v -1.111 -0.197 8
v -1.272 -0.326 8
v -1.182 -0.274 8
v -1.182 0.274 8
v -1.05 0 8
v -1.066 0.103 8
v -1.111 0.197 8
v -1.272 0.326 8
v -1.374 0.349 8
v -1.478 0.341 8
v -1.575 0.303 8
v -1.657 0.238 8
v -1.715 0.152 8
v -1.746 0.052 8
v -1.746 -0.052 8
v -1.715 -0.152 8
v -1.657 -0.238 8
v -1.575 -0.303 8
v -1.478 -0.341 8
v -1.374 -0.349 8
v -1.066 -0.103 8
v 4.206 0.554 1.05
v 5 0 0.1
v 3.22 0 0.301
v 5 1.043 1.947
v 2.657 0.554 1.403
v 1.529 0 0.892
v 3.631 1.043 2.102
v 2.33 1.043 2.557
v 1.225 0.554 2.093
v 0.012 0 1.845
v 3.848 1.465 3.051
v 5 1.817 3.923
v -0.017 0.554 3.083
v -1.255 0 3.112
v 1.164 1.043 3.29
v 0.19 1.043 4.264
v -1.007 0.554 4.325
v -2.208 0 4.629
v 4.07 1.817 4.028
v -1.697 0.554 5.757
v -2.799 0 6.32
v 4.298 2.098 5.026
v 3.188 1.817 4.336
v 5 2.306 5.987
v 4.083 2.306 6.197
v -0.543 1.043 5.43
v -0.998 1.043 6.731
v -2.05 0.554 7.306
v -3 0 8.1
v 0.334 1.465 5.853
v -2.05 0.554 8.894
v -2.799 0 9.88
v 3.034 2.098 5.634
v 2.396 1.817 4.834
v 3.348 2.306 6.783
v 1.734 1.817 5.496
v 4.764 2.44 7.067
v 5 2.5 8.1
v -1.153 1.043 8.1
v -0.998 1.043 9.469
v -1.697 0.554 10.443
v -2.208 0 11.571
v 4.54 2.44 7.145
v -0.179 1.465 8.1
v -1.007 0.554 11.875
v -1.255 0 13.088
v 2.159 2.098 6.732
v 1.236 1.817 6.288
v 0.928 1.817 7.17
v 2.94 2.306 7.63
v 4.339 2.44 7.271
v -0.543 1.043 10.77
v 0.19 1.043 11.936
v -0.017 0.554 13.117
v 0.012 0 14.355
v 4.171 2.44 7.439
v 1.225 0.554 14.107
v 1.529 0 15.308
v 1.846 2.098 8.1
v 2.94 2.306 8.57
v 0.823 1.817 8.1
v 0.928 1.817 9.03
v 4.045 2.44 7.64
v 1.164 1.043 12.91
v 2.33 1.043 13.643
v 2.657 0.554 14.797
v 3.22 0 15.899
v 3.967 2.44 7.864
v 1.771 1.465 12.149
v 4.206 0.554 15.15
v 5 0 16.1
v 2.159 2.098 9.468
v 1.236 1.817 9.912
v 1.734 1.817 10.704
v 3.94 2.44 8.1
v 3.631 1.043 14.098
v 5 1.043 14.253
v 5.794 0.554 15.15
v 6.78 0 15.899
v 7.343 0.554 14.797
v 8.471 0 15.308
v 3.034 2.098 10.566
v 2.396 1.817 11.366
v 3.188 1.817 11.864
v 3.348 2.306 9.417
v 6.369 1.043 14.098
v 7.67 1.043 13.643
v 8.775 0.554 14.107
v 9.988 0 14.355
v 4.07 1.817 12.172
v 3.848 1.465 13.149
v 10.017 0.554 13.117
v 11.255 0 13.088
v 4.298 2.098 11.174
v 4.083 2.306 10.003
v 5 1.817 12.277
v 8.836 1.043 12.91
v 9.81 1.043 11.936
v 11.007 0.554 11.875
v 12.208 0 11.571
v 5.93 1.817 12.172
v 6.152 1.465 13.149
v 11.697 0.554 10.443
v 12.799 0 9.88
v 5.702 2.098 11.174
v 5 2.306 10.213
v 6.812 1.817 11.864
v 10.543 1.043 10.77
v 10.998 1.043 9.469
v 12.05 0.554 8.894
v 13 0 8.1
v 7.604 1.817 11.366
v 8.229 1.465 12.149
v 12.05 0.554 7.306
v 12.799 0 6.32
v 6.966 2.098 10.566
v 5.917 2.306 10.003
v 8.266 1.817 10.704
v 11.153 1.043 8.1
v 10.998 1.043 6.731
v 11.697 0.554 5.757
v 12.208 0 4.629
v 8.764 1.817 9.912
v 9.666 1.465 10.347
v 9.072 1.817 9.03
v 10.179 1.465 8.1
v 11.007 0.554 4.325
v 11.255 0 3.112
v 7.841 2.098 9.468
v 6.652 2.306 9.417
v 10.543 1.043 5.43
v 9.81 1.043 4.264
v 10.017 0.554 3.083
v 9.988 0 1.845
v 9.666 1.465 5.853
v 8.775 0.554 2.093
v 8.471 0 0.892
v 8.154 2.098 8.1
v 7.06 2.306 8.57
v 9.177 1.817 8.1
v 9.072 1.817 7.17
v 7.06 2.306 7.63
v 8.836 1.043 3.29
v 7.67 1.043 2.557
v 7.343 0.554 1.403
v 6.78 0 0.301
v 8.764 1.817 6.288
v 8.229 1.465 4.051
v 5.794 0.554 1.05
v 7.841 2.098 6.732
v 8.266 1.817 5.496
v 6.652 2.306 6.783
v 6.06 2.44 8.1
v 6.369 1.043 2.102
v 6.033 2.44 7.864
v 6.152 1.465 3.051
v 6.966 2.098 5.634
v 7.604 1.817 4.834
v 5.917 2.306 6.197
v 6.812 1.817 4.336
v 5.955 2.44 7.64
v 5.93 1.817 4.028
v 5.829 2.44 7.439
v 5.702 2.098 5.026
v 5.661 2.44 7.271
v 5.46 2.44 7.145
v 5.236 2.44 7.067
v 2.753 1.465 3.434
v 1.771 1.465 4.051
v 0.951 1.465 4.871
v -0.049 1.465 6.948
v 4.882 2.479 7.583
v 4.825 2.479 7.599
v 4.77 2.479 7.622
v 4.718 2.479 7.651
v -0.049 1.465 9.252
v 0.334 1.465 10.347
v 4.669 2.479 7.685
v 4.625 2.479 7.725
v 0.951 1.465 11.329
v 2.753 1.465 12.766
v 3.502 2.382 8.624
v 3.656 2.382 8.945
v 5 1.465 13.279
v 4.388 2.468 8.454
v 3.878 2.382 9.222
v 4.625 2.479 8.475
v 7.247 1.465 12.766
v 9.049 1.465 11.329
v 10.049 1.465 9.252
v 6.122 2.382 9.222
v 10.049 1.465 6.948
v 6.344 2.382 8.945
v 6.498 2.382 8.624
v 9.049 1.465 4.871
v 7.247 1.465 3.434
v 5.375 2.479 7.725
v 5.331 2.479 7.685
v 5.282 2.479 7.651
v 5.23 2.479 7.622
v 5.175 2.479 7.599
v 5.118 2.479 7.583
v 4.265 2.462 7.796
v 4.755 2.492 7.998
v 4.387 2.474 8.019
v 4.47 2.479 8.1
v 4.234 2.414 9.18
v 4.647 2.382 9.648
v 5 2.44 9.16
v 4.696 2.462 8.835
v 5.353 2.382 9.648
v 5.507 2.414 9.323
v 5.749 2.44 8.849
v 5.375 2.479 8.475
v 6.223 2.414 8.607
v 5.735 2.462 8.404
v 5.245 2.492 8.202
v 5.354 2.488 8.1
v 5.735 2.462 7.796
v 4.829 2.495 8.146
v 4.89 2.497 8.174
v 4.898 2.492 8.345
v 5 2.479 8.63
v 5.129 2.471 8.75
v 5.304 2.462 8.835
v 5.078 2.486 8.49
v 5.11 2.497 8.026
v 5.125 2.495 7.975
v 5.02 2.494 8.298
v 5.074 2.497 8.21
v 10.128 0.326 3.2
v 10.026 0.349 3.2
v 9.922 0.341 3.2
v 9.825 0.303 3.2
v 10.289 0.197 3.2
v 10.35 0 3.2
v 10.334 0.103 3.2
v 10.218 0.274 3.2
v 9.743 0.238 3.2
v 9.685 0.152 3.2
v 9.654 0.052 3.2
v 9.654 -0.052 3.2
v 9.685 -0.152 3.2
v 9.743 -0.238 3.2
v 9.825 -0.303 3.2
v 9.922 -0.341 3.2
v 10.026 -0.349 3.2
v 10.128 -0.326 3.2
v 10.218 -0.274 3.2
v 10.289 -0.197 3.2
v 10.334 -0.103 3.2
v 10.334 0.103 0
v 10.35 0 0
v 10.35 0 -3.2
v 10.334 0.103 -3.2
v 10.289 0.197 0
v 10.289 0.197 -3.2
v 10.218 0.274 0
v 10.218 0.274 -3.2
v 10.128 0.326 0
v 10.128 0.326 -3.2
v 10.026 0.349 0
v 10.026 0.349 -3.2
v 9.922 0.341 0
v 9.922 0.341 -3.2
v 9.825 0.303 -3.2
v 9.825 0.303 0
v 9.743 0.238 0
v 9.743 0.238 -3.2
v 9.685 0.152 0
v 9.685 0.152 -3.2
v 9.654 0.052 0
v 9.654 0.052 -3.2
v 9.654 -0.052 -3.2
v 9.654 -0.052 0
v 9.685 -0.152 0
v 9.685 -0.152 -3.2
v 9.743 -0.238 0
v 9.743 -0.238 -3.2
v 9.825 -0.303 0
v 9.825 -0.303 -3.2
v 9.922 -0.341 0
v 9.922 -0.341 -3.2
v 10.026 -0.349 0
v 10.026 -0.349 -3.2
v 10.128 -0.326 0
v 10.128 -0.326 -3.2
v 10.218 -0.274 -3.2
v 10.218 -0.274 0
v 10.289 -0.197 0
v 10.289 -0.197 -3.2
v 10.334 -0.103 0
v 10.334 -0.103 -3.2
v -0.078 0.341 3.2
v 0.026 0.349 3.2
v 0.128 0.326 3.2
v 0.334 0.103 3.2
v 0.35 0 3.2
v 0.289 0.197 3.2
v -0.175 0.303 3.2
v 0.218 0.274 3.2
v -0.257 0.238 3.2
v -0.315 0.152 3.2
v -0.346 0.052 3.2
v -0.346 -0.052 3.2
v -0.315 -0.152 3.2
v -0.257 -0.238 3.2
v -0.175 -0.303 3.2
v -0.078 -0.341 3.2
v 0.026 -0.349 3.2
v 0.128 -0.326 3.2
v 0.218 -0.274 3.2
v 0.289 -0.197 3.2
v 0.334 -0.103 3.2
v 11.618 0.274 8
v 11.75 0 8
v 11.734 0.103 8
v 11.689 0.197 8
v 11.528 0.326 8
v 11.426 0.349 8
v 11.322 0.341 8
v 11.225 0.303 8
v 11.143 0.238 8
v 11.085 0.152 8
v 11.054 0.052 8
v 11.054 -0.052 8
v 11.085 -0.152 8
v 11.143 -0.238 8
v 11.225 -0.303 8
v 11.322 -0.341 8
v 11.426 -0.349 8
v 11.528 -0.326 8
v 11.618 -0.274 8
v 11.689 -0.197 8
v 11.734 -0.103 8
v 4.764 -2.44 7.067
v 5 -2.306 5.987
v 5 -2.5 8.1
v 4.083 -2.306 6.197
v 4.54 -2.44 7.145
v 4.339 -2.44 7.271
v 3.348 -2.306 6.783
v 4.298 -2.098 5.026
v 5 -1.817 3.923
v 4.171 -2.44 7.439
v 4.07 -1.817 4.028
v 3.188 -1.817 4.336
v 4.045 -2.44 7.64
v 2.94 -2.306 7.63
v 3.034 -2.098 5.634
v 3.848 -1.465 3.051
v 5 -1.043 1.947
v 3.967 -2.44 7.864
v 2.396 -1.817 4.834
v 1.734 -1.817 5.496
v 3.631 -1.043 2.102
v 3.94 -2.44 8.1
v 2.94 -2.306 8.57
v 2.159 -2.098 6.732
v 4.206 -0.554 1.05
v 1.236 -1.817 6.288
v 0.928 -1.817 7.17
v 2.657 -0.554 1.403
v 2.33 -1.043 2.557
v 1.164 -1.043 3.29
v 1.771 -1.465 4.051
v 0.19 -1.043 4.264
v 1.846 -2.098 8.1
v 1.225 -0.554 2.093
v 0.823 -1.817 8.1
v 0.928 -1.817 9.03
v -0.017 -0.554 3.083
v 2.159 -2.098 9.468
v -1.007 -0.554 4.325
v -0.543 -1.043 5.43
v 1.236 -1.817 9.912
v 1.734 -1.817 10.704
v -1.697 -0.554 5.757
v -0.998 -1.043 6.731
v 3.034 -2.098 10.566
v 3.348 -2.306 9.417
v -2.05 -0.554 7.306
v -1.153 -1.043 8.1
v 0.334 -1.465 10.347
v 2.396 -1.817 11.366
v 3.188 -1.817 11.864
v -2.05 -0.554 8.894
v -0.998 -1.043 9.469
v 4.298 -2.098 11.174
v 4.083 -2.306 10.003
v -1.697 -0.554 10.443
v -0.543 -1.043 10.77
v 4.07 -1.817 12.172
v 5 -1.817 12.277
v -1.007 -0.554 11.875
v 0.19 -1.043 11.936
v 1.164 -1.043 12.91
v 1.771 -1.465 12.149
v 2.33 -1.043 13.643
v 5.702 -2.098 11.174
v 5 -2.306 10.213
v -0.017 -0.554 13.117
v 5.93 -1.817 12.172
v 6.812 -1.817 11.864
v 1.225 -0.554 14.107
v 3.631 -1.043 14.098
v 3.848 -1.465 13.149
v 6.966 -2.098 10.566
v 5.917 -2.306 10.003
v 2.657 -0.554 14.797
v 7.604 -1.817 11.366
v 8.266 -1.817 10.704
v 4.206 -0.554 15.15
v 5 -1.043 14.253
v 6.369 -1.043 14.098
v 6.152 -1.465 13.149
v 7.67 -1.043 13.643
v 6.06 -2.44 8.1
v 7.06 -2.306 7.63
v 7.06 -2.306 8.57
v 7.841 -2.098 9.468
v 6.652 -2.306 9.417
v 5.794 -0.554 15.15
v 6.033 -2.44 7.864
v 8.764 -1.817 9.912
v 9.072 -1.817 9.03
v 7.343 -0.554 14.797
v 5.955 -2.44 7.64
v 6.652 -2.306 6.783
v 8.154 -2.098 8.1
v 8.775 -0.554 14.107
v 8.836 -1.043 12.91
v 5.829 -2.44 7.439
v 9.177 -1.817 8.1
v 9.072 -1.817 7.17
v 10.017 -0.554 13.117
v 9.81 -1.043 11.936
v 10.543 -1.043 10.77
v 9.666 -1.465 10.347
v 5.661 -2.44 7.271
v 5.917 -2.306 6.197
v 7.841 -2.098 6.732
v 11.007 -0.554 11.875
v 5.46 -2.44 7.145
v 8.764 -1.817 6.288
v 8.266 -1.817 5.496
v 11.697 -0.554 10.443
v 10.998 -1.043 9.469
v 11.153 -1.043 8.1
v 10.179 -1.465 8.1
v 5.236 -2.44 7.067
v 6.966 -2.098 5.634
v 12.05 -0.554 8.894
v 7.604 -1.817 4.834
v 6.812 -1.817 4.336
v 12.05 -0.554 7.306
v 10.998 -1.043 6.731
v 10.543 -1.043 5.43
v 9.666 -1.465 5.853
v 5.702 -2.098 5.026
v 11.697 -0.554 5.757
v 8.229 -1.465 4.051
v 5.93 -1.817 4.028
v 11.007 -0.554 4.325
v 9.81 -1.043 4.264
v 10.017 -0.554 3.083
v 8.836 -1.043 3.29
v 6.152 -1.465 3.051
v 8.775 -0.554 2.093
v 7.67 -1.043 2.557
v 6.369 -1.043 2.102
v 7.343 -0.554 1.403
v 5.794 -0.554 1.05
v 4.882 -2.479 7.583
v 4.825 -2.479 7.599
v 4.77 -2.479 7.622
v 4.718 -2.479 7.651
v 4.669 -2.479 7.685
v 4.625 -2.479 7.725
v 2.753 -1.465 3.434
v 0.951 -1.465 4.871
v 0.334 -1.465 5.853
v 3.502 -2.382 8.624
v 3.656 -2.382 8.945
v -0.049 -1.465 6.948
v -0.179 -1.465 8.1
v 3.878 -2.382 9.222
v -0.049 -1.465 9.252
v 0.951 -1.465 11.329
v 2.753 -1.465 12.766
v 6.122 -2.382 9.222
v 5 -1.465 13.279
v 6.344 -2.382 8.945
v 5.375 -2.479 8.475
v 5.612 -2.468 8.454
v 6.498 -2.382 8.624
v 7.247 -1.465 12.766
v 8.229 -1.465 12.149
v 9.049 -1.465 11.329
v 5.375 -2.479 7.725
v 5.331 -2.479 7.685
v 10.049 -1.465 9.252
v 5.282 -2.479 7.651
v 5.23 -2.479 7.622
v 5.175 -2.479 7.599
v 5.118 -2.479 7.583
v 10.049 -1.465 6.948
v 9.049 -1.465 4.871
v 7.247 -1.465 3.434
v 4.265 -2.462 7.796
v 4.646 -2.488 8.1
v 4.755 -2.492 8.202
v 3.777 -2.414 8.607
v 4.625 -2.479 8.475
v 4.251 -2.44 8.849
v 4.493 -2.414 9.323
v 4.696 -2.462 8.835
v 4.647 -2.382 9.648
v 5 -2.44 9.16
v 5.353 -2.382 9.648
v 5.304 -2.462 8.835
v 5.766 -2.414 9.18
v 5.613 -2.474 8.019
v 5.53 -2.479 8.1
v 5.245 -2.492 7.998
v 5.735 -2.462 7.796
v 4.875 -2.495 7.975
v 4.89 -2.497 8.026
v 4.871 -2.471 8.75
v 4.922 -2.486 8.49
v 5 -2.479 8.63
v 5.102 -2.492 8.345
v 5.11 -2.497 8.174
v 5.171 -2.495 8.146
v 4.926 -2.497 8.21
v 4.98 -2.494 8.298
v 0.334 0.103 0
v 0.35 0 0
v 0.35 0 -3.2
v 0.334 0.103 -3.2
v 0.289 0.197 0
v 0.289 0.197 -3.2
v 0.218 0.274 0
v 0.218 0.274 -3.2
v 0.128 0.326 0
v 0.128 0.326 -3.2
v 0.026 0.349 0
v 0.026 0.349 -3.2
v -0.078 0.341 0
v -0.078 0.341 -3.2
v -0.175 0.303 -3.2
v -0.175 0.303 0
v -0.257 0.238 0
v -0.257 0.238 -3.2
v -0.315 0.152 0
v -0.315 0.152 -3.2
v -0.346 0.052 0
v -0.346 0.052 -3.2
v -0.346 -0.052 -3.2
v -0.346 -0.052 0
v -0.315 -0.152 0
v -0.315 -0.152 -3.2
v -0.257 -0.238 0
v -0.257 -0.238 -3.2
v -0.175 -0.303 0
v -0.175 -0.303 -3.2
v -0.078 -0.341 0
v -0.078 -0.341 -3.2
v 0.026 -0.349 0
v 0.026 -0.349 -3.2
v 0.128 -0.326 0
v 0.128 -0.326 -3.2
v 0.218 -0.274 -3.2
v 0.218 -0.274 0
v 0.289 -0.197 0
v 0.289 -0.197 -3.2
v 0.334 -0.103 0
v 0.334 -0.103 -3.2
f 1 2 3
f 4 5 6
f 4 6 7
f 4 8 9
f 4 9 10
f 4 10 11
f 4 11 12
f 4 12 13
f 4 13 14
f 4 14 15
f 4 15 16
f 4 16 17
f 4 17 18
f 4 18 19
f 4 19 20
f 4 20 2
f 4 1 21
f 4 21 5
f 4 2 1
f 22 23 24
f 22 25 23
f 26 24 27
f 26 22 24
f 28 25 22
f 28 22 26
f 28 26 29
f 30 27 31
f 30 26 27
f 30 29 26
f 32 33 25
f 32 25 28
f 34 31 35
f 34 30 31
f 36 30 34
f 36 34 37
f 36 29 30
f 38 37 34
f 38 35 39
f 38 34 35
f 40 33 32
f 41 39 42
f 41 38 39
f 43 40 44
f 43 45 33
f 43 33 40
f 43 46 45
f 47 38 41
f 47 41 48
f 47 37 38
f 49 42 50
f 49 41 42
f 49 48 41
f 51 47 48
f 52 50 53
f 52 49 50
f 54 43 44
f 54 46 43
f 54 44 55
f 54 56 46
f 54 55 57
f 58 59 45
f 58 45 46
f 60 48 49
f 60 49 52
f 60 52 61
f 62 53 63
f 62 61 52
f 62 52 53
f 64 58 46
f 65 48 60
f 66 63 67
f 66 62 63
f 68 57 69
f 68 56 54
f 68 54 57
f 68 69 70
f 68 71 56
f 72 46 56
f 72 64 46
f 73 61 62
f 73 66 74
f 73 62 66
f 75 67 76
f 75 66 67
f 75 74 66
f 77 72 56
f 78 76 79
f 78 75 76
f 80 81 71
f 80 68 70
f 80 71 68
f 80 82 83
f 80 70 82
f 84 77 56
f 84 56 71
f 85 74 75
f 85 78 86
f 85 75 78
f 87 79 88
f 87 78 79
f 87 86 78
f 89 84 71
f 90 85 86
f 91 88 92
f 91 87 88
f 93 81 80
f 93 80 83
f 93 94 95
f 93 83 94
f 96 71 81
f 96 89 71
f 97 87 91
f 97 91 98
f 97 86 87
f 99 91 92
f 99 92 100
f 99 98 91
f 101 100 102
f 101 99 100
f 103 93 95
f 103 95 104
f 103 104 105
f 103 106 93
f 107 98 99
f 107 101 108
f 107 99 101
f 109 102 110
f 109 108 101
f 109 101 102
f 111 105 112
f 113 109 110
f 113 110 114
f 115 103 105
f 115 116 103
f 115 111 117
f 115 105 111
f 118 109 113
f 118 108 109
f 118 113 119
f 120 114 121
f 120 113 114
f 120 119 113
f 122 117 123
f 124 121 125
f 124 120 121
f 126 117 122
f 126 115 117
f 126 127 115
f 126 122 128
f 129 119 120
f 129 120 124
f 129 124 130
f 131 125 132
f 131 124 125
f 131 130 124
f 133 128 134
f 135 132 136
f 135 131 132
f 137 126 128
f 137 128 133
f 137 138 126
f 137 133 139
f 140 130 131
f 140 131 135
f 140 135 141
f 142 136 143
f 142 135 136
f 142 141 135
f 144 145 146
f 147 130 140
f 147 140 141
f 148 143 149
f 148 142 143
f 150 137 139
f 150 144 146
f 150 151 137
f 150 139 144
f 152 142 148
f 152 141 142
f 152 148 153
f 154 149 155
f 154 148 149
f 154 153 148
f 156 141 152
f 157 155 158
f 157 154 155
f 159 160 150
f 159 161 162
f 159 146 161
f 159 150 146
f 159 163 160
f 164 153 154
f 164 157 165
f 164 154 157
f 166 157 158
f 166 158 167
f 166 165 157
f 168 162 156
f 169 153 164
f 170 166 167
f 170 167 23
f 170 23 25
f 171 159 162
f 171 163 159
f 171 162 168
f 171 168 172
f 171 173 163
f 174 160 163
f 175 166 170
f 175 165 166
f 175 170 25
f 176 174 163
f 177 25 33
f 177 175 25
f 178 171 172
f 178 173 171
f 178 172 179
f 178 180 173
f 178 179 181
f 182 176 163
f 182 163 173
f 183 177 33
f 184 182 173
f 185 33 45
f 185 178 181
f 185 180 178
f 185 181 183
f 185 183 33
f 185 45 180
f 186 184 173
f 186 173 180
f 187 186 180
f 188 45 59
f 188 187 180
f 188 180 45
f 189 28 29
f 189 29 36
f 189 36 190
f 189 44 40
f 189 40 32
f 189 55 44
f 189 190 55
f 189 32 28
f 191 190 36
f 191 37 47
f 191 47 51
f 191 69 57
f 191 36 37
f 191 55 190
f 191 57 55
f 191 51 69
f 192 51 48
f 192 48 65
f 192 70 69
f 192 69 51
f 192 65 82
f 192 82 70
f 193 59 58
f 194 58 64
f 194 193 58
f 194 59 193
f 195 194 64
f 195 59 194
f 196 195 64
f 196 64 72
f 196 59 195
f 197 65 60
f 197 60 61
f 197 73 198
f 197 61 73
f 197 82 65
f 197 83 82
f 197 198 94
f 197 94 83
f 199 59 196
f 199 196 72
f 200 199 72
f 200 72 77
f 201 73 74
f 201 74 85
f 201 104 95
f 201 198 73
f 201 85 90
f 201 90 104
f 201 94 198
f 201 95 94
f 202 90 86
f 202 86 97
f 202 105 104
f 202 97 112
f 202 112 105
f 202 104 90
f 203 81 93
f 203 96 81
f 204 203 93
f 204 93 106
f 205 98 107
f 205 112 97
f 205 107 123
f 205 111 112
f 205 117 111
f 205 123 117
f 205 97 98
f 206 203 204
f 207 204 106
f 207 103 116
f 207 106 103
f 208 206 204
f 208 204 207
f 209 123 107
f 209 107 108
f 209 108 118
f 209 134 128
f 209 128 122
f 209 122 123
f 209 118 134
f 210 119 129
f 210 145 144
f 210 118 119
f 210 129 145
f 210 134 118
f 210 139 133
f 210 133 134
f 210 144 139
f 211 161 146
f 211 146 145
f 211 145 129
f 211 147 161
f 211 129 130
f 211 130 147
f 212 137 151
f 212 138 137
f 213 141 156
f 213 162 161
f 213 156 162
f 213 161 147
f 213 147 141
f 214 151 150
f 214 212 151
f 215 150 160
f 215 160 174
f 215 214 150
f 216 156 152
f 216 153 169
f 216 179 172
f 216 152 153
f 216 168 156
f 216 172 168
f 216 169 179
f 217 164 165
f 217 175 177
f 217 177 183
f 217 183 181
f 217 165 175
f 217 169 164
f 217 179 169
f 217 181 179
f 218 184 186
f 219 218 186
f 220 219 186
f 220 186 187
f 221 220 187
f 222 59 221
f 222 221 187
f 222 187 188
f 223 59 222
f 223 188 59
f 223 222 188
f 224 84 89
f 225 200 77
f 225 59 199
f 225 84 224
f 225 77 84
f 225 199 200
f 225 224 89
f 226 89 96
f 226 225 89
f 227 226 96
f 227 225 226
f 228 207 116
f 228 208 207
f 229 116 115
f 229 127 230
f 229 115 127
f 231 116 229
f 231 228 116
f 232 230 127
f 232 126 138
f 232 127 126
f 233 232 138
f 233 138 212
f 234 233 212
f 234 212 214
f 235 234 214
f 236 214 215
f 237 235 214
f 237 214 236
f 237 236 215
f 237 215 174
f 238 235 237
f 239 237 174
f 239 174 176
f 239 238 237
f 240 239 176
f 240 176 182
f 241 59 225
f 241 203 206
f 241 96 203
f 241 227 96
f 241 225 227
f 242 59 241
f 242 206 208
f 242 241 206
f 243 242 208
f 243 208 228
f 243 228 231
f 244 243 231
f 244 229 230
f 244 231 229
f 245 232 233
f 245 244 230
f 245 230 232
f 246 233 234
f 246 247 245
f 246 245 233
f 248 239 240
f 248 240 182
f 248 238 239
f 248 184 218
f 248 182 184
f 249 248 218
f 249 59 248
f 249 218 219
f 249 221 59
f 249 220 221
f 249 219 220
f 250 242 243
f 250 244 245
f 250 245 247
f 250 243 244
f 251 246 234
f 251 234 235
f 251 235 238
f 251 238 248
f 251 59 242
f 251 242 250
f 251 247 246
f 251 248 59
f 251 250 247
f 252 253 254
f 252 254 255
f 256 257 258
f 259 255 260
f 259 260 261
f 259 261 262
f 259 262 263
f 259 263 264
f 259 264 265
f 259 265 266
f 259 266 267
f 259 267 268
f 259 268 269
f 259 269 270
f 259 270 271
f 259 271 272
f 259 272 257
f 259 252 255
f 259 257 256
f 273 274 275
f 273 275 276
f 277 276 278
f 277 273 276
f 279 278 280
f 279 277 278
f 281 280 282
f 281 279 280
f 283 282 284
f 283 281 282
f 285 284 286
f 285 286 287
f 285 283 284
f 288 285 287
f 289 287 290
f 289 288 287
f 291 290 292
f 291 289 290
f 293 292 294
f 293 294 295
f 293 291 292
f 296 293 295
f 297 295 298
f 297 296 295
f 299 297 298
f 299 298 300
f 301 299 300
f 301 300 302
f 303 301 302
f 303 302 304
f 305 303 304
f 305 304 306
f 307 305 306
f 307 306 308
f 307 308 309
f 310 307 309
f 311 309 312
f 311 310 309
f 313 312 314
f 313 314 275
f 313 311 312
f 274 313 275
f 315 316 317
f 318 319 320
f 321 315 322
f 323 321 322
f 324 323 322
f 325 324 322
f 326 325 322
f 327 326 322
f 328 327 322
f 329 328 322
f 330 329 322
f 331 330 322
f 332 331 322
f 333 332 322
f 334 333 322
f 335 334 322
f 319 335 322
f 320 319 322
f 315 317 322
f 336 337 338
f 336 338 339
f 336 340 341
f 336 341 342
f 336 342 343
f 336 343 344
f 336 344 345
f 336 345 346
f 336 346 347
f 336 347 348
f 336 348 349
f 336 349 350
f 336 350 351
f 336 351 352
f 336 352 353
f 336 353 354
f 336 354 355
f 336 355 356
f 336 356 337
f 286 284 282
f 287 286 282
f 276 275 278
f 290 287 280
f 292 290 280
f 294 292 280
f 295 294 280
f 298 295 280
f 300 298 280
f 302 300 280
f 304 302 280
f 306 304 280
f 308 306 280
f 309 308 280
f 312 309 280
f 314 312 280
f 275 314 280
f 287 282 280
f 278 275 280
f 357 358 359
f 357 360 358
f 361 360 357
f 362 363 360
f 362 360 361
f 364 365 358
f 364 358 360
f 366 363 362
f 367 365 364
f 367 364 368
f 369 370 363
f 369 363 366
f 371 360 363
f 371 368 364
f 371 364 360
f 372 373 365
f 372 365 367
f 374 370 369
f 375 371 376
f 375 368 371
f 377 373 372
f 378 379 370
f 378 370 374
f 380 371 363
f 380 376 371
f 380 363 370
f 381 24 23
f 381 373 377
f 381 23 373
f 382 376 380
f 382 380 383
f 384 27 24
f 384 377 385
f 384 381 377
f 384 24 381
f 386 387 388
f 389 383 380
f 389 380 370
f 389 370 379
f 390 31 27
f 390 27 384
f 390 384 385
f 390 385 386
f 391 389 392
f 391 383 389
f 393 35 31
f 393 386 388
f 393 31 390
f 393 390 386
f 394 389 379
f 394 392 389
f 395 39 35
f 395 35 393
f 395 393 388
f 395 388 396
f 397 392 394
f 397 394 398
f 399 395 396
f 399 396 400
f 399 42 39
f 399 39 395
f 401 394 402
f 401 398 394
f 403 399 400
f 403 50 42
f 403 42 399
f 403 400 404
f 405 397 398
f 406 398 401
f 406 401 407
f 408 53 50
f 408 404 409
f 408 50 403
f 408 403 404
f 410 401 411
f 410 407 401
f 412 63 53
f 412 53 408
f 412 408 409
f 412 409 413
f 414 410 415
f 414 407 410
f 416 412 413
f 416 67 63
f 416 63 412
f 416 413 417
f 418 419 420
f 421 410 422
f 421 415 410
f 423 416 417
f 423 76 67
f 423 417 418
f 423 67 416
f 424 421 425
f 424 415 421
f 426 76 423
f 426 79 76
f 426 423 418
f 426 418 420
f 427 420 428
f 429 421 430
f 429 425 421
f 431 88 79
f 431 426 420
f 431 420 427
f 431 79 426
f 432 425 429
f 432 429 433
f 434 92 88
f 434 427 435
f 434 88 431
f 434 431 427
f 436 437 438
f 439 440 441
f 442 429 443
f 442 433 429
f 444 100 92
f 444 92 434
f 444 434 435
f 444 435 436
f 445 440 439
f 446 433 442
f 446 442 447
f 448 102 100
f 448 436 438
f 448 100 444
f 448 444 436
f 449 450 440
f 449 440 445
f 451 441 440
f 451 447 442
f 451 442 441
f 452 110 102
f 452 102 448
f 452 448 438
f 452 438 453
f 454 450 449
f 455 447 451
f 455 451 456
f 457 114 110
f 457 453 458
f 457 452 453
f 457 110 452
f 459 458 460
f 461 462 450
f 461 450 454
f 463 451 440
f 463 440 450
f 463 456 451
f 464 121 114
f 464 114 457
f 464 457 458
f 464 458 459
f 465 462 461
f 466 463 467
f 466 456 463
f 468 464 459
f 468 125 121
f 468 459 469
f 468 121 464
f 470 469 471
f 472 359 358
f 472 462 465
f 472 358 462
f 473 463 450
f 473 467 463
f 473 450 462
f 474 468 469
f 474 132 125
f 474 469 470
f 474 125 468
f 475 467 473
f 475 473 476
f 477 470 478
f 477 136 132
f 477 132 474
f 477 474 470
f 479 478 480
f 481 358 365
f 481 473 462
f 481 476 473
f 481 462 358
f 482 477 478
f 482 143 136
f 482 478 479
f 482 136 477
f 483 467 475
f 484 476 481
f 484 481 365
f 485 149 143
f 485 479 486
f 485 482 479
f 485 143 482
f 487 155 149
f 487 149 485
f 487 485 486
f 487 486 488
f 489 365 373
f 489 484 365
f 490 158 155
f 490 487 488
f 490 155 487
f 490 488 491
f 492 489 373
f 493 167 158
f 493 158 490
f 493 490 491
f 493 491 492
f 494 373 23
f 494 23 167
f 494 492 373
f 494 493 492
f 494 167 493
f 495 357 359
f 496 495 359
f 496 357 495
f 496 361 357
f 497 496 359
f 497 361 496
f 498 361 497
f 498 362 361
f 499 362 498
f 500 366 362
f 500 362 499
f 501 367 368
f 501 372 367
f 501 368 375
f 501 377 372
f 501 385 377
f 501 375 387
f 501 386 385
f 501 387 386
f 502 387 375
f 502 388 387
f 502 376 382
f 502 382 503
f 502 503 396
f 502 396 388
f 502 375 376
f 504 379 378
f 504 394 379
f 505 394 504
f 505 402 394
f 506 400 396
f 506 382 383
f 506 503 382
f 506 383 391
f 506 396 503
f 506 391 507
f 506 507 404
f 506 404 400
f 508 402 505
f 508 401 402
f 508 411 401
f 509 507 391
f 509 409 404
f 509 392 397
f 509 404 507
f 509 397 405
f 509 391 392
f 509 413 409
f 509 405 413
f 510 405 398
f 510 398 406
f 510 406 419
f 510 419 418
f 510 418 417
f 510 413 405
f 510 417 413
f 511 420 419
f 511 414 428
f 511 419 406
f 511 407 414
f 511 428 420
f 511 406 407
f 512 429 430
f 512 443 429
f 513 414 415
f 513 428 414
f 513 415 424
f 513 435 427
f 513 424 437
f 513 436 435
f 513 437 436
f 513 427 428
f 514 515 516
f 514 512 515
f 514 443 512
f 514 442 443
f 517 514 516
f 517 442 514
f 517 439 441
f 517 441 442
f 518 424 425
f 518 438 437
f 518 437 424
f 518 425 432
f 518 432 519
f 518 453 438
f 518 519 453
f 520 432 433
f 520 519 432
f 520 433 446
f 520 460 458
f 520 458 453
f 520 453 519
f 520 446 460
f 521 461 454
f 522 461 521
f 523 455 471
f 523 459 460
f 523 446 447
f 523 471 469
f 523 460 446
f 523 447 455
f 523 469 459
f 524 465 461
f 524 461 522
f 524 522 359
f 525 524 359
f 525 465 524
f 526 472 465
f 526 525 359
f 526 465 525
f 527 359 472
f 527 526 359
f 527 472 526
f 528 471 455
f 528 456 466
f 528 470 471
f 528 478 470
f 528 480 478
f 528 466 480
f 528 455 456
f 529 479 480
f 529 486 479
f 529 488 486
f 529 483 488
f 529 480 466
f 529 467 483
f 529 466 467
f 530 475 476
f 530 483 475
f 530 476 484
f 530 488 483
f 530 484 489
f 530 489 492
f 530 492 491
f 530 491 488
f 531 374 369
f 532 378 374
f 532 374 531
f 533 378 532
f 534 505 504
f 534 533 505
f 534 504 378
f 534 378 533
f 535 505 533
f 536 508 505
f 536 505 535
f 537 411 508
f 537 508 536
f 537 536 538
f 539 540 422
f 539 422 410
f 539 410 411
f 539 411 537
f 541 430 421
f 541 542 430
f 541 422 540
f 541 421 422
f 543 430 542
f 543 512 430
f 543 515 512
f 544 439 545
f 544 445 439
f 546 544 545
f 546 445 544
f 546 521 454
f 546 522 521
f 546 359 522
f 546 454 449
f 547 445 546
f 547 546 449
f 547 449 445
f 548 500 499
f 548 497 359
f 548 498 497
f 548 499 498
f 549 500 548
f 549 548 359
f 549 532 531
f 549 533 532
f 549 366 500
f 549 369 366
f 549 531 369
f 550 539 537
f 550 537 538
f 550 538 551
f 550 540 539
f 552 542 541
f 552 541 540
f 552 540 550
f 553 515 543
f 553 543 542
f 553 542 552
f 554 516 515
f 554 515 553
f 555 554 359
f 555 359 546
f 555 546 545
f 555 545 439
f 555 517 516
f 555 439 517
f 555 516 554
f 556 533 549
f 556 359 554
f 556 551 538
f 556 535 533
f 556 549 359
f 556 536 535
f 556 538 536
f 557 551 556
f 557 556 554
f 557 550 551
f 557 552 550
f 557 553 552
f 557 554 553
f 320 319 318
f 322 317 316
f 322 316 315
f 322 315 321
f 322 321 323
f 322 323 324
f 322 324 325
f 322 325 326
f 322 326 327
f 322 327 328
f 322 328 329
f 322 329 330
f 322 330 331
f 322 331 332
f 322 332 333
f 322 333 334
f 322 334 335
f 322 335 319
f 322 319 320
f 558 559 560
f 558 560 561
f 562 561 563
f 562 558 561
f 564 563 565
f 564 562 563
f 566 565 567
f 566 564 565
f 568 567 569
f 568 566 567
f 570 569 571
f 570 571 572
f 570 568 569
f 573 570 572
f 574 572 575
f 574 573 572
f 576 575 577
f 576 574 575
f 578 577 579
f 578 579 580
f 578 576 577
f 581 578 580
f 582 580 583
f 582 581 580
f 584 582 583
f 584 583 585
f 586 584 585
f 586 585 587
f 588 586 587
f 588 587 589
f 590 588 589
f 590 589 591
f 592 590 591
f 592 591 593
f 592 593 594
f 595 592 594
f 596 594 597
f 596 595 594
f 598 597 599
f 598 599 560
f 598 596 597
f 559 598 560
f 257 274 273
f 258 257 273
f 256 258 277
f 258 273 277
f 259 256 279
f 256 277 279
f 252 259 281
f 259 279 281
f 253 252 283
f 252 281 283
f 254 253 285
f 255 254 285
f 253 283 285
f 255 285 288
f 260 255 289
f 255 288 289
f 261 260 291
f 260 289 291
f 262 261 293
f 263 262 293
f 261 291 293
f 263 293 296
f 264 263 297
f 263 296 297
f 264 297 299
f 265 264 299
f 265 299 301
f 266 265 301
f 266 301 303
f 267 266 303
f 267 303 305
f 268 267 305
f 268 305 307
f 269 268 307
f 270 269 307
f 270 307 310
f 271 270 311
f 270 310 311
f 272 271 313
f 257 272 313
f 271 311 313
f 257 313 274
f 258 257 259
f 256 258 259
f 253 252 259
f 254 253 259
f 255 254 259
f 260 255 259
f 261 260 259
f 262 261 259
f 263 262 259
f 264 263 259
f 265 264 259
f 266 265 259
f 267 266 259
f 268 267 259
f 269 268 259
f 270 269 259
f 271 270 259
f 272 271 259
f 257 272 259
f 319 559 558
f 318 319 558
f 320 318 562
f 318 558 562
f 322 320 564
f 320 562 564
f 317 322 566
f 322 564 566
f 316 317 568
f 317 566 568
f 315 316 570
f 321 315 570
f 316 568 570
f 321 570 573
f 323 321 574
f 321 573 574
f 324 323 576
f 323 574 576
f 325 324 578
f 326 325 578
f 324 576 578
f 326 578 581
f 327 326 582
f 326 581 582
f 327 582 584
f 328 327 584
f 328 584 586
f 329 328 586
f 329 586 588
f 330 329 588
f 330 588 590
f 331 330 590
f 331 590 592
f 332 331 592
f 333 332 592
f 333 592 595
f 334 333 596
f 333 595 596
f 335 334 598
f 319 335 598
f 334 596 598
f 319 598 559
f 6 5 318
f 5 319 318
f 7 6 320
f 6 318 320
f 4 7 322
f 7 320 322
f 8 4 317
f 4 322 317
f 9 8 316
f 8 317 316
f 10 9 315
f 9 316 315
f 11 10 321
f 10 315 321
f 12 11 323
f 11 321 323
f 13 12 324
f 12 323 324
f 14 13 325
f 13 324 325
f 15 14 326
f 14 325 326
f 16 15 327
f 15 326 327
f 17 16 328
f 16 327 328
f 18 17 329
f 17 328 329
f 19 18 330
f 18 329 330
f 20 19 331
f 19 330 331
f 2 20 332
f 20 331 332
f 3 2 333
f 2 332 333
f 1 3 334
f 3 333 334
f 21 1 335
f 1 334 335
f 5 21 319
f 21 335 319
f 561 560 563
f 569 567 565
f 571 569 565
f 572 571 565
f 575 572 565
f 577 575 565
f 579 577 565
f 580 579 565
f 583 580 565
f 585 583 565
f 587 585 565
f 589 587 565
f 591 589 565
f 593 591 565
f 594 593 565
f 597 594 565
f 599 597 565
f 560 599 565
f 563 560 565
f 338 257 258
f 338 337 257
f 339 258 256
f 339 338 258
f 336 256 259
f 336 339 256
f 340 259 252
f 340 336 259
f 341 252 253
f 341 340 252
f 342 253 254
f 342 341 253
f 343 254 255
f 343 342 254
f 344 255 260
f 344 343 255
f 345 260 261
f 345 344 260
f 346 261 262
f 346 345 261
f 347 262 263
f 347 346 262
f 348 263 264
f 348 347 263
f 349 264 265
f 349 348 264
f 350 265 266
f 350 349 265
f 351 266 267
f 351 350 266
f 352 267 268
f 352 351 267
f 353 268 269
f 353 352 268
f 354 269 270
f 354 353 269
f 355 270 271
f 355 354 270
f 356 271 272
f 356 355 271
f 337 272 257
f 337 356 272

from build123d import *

# Parameters (mm, degrees)
SKETCH001_R       = 0.35
PAD001_DEPTH      = 3.2
PAD001_DEPTH_BACK = -3.2
SKETCH002_R       = 0.35
SKETCH003_R       = 0.35
SKETCH004_R       = 0.35
SKETCH005_R       = 0.35


with BuildPart() as pad001:
    # Sketch001 → Pad001 (new body, two sides)
    with BuildSketch(Plane.XY) as pad001_sk:
        Circle(SKETCH001_R)
        with Locations((10, 0)):
            Circle(SKETCH001_R)
    extrude(amount=-PAD001_DEPTH)
    extrude(pad001_sk.sketch, amount=-PAD001_DEPTH_BACK)


with BuildPart() as revolution:
    # Sketch → Revolution (revolve)
    with BuildSketch(Plane.YZ.offset(5)):
        with BuildLine():
            Line((-2.5, 8.1), (2.5, 8.1))
            ThreePointArc((0, 0.1), (1.817073, 3.92279), (2.5, 8.1))
            ThreePointArc((-2.5, 8.1), (-1.817073, 3.92279), (0, 0.1))
        make_face()
    revolve(axis=Axis((5, -3.32079, 8.1), (0, 1, 0)))


with BuildPart() as loft_body:
    # Sketch002 → Loft section 0
    with BuildSketch(Plane.XY.offset(8)):
        with Locations((-1.4, 0)):
            Circle(SKETCH002_R)
    # Sketch003 → Loft section 1
    with BuildSketch(Plane.XY.offset(3.2)):
        Circle(SKETCH003_R)
    loft()


with BuildPart() as loft001:
    # Sketch004 → Loft001 section 0
    with BuildSketch(Plane.XY.offset(3.2)):
        with Locations((10, 0)):
            Circle(SKETCH004_R)
    # Sketch005 → Loft001 section 1
    with BuildSketch(Plane.XY.offset(8)):
        with Locations((11.4, 0)):
            Circle(SKETCH005_R)
    loft()


solid = Compound([pad001.part, revolution.part, loft_body.part, loft001.part])
